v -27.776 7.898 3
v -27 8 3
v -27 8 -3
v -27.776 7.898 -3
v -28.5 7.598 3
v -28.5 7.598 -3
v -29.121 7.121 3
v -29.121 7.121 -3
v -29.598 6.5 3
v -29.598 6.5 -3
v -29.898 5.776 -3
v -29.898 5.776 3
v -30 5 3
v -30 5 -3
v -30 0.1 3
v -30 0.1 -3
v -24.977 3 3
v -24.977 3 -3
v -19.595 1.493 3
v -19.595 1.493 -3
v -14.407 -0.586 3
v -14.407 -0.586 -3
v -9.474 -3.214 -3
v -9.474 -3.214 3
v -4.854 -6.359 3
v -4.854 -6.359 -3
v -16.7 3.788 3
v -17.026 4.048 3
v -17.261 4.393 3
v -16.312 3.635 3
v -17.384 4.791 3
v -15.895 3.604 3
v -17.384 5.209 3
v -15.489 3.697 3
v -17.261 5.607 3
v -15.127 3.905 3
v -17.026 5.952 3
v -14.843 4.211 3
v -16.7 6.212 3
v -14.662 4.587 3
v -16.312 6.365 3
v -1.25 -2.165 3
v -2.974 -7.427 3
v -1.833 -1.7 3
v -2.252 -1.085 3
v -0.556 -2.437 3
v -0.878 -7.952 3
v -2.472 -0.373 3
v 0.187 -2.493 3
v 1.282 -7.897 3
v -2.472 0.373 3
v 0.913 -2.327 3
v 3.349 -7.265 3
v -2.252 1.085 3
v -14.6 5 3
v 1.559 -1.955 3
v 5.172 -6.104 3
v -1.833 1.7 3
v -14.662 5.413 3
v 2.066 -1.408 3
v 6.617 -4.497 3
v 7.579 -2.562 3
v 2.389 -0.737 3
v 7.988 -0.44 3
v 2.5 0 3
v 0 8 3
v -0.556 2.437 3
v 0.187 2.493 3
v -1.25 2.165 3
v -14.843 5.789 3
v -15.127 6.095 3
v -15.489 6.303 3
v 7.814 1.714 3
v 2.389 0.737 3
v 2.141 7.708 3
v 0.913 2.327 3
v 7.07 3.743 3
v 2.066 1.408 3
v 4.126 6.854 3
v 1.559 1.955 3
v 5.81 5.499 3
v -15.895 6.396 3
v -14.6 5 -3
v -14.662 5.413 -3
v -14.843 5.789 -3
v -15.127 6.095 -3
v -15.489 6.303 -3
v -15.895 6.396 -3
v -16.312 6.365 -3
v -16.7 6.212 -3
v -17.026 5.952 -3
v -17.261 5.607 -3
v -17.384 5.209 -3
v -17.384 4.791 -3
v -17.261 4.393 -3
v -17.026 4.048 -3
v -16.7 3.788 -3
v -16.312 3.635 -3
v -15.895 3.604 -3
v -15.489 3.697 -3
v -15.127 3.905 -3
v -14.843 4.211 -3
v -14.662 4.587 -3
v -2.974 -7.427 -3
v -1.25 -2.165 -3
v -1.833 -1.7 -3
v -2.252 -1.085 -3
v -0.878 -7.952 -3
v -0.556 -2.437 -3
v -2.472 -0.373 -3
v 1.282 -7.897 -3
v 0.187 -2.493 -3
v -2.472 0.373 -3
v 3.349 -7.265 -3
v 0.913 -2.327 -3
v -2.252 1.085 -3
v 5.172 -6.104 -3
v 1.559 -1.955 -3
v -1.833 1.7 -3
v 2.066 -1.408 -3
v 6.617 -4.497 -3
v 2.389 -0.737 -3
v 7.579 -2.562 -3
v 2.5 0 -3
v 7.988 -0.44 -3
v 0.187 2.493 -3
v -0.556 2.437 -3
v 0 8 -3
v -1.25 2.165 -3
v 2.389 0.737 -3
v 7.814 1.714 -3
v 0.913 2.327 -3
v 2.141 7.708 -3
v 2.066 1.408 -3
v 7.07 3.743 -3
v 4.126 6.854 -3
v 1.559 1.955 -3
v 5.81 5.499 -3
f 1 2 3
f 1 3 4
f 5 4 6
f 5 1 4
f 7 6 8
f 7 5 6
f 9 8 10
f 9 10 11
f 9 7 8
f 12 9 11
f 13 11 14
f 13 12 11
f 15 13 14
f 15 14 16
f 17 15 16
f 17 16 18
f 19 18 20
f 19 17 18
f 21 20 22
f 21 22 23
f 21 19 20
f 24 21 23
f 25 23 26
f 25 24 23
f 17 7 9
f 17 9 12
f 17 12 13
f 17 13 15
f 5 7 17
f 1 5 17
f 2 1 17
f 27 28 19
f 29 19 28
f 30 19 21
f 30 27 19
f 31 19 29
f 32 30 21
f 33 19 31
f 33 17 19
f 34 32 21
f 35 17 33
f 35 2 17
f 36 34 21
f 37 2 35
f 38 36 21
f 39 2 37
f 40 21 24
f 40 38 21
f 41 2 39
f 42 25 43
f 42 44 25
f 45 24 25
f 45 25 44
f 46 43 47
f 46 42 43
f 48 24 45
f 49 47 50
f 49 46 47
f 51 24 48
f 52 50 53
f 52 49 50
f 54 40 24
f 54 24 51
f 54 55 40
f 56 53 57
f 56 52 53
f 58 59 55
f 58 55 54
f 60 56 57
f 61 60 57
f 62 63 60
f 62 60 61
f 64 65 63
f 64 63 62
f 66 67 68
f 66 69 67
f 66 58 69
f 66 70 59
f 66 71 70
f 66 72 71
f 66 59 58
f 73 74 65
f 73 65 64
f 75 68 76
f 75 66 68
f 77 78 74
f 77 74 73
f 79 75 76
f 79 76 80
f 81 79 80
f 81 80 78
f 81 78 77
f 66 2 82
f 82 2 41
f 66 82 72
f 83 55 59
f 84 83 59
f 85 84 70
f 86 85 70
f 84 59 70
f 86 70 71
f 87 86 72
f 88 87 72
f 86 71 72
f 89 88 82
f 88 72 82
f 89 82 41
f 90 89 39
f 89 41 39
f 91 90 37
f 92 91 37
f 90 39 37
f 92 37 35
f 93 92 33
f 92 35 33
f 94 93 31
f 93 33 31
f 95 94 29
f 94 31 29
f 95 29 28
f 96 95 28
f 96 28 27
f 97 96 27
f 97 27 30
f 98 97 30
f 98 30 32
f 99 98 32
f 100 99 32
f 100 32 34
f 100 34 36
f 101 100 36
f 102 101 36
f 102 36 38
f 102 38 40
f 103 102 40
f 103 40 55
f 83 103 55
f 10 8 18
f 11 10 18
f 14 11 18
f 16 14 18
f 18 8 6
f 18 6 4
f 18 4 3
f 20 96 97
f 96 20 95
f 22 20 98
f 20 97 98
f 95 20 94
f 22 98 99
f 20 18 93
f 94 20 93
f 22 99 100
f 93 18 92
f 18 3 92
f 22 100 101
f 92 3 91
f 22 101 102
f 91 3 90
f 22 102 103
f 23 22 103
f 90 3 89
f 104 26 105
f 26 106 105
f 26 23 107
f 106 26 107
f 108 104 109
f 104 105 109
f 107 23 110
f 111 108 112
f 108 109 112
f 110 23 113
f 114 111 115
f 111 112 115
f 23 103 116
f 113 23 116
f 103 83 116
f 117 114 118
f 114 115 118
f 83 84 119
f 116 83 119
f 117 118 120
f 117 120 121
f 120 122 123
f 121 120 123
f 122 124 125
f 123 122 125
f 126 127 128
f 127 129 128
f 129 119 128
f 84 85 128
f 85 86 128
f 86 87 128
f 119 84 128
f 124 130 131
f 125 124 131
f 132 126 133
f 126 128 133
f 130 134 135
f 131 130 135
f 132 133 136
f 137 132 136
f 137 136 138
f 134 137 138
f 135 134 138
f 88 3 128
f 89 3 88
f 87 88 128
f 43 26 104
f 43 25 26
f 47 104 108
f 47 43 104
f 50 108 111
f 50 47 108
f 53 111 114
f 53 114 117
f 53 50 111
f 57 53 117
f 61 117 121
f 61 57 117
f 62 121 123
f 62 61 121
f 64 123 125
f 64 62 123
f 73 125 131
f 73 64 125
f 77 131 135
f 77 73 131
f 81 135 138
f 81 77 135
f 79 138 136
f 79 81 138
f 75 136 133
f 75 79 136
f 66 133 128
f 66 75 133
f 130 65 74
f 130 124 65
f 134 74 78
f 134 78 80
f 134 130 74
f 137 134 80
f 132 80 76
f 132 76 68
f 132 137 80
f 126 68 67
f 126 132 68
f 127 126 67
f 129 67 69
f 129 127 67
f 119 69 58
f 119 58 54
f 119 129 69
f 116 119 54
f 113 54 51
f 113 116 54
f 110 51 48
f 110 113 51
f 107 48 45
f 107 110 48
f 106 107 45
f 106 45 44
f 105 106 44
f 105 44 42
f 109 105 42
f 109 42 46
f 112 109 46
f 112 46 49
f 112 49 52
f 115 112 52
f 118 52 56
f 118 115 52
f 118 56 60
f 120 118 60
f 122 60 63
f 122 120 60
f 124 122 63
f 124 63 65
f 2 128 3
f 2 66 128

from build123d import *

# Parameters (mm, degrees)
SKETCH1_R           = 2.5
BOSS_EXTRUDE1_DEPTH = 3
SKETCH2_R           = 1.4
CUT_EXTRUDE1_DEPTH  = 10


with BuildPart() as part:
    # Sketch1 → Boss-Extrude1 (new, symmetric)
    with BuildSketch(Plane.XY):
        with BuildLine():
            Line((0, 8), (-27, 8))
            ThreePointArc((-27, 8), (-29.121320344, 7.121320344), (-30, 5))
            Line((-30, 5), (-30, 0.1))
            Line((-30, 0.1), (-24.977052658, 3))
            ThreePointArc((-24.977052658, 3), (-14.406610269, -0.585971857), (-4.85358477, -6.359458694))
            ThreePointArc((-4.85358477, -6.359458694), (7.578775282, -2.561672349), (0, 8))
        make_face()
        Circle(SKETCH1_R, mode=Mode.SUBTRACT)
    extrude(amount=BOSS_EXTRUDE1_DEPTH, both=True)

    # Sketch2 → Cut-Extrude1 (cut)
    with BuildSketch(Plane.XY.offset(3)):
        with Locations((-16, 5)):
            Circle(SKETCH2_R)
    extrude(amount=-CUT_EXTRUDE1_DEPTH, mode=Mode.SUBTRACT)


solid = part.part
